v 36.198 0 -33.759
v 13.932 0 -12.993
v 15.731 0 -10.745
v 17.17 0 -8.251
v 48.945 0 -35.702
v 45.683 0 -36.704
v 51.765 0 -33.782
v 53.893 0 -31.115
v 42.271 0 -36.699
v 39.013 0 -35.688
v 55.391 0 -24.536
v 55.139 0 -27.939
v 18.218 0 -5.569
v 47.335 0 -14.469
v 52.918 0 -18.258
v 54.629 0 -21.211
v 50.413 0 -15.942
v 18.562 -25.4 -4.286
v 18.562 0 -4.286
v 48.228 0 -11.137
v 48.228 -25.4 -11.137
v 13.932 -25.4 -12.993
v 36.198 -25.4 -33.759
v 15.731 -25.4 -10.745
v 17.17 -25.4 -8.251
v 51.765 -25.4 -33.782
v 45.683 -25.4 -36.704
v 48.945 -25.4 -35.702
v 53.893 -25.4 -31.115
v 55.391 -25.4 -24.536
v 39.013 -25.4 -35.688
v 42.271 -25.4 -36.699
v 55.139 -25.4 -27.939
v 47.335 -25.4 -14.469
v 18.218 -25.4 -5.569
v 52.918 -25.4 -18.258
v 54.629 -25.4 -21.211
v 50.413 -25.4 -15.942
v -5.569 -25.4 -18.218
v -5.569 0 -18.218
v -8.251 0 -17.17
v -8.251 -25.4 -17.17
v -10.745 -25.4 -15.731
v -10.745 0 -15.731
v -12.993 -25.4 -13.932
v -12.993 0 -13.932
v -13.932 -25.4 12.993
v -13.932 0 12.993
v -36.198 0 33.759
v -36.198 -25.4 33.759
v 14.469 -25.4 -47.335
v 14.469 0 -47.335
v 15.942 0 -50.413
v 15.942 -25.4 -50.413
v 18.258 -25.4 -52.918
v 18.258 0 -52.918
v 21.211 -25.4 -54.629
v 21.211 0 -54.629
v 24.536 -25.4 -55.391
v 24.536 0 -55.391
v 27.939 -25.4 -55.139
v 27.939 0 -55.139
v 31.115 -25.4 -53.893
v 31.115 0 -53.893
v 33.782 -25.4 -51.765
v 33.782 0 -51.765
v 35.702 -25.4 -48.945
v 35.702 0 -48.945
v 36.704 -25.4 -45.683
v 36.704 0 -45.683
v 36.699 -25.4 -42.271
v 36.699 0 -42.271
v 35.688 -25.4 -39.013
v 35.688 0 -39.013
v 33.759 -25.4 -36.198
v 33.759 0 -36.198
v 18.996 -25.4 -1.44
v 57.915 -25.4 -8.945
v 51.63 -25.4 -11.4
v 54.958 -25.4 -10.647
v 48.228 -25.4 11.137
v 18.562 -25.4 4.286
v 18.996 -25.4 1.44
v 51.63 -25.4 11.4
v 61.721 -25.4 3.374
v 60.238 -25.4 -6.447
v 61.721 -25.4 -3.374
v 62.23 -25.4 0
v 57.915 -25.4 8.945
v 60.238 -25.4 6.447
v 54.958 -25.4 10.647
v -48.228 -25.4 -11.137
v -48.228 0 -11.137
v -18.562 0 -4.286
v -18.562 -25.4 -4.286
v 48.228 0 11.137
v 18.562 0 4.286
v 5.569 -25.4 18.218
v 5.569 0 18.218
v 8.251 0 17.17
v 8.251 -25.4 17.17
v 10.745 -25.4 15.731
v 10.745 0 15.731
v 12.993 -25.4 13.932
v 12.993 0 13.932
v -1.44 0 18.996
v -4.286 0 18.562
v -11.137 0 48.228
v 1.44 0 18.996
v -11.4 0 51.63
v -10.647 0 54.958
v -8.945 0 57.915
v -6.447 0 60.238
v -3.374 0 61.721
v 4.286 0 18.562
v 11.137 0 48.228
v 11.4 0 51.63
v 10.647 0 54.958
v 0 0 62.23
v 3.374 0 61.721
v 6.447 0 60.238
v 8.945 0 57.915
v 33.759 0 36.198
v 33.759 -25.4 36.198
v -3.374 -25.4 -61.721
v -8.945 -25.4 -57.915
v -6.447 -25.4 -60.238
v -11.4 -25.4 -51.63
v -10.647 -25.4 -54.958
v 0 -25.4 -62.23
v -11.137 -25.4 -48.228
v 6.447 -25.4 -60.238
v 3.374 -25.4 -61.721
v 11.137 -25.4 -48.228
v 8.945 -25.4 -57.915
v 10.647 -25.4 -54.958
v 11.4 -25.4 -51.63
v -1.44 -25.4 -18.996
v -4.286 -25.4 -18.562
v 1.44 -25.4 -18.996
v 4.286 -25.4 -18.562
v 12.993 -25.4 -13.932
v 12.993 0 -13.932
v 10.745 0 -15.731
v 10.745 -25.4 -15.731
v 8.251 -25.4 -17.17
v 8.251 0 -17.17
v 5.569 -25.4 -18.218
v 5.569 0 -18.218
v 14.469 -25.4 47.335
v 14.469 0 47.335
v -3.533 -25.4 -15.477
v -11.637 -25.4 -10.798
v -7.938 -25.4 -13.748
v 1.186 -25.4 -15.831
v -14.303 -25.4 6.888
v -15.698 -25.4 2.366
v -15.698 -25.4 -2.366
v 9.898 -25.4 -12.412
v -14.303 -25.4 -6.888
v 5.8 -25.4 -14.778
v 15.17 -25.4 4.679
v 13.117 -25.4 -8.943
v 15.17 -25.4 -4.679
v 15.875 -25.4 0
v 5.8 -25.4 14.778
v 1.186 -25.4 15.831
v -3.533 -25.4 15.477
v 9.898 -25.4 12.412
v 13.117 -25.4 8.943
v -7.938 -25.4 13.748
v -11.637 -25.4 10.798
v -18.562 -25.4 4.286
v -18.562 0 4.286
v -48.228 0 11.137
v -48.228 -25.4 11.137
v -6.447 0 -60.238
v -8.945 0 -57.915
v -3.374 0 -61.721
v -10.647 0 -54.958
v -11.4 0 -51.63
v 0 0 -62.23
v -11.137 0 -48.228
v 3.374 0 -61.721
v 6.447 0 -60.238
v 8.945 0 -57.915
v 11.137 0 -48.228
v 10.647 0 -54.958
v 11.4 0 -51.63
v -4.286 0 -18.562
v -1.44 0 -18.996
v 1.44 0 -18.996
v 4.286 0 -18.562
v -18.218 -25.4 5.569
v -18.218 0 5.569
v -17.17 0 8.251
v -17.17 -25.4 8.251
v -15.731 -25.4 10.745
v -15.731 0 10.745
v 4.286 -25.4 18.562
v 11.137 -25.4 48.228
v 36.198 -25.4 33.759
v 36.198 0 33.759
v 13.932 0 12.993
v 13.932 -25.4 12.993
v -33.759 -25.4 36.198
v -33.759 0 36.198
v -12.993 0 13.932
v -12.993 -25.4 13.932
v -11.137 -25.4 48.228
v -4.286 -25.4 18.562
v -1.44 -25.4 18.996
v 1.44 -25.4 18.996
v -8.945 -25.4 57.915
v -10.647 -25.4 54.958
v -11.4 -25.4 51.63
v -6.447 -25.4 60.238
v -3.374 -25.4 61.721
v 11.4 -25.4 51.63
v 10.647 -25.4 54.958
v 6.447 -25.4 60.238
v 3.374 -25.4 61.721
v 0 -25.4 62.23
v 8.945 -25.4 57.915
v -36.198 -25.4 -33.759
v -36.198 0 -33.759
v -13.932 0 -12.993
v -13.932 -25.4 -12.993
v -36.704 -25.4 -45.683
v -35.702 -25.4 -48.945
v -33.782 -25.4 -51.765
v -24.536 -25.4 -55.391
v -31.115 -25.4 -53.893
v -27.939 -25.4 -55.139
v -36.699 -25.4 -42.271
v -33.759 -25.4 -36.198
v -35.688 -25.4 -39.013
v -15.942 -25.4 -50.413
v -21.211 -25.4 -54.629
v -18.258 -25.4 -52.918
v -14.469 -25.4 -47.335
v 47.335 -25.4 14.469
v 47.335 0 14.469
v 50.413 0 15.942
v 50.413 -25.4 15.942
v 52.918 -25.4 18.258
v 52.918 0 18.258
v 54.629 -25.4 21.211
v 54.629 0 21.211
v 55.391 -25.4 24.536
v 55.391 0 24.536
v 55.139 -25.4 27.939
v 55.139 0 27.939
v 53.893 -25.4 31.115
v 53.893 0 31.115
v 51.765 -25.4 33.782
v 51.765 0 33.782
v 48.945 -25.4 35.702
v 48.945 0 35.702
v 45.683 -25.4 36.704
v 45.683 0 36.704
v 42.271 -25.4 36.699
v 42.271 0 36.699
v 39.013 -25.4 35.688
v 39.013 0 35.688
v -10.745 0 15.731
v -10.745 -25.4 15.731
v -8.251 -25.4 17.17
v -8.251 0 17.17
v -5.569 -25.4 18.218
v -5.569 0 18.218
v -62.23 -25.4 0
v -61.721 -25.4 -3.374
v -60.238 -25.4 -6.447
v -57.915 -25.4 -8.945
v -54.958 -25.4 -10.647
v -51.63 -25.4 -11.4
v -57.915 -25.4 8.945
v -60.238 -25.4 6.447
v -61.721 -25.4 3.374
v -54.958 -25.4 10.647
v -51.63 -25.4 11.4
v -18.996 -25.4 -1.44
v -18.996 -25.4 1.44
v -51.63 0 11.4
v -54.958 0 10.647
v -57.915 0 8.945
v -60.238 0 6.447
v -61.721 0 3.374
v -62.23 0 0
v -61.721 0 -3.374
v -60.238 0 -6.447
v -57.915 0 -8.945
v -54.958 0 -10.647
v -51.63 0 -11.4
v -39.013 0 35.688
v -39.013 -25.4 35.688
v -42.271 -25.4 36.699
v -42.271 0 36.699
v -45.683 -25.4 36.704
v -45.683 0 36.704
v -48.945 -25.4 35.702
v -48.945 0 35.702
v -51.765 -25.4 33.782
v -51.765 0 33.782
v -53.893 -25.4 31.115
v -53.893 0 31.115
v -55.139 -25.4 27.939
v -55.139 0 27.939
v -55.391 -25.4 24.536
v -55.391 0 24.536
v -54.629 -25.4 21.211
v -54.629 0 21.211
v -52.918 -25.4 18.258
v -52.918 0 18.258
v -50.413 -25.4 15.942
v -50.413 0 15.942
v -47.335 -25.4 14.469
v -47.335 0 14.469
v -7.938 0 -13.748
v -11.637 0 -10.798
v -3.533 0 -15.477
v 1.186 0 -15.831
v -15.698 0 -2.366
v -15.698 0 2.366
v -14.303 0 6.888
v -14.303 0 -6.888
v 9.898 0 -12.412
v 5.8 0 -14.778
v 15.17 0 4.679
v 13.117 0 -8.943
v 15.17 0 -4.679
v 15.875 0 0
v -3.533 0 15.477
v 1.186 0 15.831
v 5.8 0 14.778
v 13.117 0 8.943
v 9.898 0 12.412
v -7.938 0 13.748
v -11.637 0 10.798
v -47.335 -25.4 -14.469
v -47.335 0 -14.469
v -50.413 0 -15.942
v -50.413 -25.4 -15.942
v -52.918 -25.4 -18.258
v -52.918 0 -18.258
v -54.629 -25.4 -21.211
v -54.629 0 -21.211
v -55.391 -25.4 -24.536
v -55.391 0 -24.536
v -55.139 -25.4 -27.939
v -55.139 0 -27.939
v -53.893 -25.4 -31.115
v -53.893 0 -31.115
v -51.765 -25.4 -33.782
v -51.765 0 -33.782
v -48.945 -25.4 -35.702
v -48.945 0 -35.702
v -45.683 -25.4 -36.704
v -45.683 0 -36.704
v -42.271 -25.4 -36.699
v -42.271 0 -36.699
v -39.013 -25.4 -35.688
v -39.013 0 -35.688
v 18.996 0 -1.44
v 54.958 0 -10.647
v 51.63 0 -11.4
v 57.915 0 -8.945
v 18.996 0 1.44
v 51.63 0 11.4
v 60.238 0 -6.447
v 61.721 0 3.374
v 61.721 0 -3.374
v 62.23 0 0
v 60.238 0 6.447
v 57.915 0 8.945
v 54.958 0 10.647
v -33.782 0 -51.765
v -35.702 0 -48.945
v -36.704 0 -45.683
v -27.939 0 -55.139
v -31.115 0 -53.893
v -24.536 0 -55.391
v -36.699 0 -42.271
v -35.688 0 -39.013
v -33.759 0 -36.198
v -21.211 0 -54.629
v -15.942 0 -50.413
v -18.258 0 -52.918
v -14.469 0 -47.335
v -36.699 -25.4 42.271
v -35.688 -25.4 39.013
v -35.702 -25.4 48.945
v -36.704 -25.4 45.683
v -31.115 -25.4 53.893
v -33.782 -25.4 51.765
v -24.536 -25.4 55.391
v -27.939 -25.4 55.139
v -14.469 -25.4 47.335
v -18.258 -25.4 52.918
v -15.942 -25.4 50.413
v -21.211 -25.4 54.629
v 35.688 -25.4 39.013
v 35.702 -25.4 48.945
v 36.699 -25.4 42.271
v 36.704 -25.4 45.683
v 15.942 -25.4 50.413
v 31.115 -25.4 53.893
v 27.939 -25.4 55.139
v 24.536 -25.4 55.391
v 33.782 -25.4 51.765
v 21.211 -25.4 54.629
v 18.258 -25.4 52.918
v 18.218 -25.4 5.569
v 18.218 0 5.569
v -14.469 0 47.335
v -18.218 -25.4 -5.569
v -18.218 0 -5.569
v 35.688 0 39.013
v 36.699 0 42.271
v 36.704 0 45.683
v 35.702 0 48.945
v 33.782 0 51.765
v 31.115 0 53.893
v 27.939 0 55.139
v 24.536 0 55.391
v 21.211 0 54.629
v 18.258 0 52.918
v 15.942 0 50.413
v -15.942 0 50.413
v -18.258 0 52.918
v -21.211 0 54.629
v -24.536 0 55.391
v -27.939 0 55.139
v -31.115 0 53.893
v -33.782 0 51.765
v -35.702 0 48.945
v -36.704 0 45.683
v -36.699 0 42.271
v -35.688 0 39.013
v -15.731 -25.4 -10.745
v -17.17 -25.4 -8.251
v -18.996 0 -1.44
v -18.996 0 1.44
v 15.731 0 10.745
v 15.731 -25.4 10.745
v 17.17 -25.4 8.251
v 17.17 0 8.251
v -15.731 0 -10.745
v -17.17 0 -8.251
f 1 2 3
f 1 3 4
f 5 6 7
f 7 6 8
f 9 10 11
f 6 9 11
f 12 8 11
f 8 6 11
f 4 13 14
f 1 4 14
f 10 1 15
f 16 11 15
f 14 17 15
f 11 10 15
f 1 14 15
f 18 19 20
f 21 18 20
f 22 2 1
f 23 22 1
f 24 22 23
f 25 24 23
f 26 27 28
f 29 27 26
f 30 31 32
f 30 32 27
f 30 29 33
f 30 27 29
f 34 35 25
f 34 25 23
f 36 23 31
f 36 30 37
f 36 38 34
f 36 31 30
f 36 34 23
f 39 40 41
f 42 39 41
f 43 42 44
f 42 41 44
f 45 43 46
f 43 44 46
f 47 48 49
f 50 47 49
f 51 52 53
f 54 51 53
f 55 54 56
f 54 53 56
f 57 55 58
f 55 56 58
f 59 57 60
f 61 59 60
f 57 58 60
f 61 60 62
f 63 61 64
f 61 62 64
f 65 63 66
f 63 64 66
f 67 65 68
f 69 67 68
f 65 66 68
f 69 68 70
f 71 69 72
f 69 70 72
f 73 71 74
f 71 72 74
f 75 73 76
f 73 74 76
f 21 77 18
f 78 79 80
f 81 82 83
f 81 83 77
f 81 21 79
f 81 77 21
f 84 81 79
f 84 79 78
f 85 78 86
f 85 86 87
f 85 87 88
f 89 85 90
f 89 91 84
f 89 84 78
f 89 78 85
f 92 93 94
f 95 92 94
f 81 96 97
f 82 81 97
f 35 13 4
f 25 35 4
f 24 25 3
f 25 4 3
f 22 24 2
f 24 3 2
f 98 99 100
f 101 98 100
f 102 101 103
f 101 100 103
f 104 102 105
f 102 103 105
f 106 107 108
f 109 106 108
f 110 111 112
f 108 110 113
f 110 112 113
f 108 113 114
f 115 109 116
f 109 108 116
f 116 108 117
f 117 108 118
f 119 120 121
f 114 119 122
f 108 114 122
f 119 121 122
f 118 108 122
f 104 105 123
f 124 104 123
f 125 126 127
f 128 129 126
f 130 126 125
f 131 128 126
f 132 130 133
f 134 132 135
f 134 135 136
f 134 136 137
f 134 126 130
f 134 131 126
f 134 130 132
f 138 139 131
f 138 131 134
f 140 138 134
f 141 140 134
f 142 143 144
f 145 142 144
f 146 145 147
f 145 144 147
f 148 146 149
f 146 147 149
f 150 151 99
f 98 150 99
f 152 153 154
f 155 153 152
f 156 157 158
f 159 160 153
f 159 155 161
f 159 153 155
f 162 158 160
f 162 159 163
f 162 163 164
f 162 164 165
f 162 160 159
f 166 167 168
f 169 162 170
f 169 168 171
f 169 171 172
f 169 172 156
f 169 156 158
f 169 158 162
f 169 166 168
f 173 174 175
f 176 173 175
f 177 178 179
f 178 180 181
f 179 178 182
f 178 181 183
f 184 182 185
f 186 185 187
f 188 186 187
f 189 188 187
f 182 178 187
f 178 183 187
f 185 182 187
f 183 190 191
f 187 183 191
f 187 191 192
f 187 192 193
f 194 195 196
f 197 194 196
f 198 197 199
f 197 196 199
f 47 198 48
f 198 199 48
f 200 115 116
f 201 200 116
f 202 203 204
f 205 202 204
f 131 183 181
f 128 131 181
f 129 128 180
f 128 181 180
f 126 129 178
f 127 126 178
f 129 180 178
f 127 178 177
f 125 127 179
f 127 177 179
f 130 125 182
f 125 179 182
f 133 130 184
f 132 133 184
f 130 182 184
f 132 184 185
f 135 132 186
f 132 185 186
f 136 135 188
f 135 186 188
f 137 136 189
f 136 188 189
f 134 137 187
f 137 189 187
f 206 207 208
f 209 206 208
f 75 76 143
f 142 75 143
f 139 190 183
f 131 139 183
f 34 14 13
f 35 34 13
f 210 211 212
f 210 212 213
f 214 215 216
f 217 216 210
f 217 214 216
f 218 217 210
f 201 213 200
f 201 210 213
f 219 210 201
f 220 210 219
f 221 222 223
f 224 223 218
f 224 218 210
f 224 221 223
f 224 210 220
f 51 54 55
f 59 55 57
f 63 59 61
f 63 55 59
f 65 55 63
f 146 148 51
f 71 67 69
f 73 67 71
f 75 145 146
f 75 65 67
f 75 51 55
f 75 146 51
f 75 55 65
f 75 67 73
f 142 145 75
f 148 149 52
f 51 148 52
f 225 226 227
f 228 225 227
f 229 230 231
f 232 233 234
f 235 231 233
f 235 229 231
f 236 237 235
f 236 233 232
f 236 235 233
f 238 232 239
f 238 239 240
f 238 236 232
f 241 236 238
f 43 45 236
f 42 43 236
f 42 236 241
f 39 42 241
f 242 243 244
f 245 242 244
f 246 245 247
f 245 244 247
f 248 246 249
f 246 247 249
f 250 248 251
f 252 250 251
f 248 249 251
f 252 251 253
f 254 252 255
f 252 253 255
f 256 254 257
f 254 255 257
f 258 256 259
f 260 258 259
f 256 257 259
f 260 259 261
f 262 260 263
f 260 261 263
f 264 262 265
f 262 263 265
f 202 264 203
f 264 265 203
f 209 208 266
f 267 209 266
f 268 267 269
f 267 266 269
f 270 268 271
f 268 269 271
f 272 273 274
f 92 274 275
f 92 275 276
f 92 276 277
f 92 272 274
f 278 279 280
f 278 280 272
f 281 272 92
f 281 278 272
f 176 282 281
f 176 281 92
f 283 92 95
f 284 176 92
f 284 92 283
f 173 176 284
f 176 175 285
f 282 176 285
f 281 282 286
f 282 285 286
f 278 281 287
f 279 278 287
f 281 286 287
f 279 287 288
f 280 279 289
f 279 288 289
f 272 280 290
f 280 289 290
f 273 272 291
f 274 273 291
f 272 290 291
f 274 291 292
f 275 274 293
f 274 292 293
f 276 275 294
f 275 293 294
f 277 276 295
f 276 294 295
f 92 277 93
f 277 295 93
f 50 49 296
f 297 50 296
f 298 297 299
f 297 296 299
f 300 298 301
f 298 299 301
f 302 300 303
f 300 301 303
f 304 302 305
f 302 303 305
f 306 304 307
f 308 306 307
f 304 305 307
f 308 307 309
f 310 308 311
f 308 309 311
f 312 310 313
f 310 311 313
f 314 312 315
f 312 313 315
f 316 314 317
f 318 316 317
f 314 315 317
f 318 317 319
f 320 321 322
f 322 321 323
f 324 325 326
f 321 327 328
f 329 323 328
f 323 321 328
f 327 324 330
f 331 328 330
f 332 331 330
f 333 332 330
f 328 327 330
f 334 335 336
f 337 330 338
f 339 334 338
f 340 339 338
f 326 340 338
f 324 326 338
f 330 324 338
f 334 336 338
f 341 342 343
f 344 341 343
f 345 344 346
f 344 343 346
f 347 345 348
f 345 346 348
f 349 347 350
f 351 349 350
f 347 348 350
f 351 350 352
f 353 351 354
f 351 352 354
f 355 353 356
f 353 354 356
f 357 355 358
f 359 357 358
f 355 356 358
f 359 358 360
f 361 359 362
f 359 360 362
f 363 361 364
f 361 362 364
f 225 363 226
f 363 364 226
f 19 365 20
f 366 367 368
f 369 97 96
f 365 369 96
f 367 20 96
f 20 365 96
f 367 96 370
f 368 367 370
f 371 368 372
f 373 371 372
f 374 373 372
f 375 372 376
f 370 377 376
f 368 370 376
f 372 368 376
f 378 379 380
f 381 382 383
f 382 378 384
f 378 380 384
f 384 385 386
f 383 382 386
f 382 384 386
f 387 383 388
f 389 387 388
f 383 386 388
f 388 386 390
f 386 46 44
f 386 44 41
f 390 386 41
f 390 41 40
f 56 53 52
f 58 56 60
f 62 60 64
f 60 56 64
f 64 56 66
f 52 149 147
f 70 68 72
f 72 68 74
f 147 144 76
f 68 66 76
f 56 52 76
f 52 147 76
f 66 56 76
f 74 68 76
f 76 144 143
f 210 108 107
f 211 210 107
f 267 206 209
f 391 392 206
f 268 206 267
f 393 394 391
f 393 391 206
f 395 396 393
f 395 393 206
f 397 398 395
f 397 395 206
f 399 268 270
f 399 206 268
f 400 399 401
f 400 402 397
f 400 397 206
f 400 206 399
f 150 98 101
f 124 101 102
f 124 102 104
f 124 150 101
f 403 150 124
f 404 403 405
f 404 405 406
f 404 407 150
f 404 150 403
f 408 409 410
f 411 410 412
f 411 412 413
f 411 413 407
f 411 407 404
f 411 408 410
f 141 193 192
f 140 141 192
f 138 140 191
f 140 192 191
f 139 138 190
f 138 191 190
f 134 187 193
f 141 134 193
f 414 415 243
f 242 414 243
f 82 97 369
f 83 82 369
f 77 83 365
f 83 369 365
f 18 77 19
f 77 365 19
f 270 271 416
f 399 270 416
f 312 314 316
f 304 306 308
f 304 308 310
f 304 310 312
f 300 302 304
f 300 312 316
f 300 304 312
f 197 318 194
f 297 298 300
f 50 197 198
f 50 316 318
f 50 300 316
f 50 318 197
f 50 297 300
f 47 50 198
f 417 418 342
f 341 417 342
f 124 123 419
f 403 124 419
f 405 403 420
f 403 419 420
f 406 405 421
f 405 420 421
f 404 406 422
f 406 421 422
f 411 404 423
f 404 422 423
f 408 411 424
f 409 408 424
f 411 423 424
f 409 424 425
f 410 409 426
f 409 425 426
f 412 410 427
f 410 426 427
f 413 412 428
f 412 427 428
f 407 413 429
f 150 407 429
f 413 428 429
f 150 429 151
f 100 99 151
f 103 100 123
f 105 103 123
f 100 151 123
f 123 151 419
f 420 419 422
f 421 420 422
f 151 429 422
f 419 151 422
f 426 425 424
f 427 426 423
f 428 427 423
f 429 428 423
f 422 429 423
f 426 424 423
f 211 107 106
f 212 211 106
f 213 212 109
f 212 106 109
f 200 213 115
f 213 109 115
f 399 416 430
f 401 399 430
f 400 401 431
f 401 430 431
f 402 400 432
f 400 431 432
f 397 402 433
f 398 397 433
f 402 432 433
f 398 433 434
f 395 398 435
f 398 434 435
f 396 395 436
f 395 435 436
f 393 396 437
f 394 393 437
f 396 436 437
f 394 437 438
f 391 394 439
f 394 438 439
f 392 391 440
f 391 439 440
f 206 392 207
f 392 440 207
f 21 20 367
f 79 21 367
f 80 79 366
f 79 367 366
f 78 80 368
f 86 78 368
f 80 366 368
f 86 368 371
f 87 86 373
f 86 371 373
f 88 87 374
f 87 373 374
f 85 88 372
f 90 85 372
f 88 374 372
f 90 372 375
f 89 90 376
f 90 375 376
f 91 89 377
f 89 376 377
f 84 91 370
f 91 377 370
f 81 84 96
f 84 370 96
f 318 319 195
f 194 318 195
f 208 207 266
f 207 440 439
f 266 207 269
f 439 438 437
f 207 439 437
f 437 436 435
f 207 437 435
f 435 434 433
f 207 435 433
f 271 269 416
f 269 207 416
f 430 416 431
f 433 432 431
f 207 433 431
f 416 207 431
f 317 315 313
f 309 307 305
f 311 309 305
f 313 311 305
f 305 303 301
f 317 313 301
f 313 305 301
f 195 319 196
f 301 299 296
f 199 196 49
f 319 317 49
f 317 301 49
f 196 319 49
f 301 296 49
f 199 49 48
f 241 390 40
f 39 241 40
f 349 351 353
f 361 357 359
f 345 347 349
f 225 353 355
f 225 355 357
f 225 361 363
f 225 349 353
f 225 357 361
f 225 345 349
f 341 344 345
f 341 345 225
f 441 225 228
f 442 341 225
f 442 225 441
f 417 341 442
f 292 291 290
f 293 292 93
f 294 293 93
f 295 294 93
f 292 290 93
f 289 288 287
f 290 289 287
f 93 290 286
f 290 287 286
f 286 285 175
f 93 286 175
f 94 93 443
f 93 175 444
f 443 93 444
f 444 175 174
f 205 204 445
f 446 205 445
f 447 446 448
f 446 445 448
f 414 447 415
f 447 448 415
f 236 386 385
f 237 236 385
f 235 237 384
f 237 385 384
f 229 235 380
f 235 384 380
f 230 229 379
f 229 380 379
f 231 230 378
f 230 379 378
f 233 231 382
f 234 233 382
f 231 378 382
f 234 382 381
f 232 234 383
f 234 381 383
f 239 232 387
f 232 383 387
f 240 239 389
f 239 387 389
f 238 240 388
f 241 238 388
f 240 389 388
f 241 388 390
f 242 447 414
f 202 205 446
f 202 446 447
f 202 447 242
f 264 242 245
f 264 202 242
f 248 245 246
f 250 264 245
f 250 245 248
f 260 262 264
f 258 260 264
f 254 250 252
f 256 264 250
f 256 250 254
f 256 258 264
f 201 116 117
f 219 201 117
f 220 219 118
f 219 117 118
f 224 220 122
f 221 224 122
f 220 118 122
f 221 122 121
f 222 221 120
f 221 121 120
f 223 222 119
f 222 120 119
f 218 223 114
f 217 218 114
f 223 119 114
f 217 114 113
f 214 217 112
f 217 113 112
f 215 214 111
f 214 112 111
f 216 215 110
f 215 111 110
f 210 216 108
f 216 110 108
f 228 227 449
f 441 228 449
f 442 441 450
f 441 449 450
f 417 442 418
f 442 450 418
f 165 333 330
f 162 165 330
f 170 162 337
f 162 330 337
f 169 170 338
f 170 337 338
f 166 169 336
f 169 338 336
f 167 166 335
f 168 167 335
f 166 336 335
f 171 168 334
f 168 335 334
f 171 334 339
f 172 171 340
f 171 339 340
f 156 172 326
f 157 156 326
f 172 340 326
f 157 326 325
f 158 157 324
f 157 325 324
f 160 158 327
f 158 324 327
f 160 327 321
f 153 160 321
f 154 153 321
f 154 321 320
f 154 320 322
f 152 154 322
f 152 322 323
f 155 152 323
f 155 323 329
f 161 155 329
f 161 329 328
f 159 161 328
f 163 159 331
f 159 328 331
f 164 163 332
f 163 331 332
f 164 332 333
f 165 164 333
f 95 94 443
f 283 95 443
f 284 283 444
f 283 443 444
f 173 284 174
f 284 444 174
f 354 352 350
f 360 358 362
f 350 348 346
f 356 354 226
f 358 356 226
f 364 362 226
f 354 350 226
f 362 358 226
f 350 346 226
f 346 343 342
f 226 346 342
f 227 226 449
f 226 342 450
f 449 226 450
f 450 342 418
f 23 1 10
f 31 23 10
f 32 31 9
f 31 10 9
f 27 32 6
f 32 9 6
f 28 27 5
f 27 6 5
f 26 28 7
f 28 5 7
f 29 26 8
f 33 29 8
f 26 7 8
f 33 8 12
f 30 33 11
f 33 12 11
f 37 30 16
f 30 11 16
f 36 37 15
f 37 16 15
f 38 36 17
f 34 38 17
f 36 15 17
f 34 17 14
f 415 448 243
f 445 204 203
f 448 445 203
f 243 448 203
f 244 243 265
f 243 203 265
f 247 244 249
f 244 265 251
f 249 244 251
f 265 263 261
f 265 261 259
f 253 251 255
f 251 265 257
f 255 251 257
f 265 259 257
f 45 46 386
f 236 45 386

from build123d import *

# Parameters (mm, degrees)
F0_R     = 15.875
F1_DEPTH = 25.4


with BuildPart() as f1:
    # F0 (on Front) → F1 (new body)
    with BuildSketch(Plane.XZ):
        with BuildLine():
            ThreePointArc((-4.28625, 18.561534), (0, 19.05), (4.28625, 18.561534))
            Line((4.28625, 18.561534), (11.136921, 48.22825))
            ThreePointArc((11.136921, 48.22825), (0, 62.23), (-11.136921, 48.22825))
            Line((-11.136921, 48.22825), (-4.28625, 18.561534))
        make_face()
        Circle(F0_R)
        with BuildLine():
            ThreePointArc((-12.992769, 13.931635), (-9.525, 16.497784), (-5.568766, 18.217885))
            Line((-5.568766, 18.217885), (-14.469269, 47.33535))
            ThreePointArc((-14.469269, 47.33535), (-31.115, 53.892761), (-33.758981, 36.198429))
            Line((-33.758981, 36.198429), (-12.992769, 13.931635))
        make_face()
        with BuildLine():
            ThreePointArc((-18.217885, 5.568766), (-16.497784, 9.525), (-13.931635, 12.992769))
            Line((-13.931635, 12.992769), (-36.198429, 33.758981))
            ThreePointArc((-36.198429, 33.758981), (-53.892761, 31.115), (-47.33535, 14.469269))
            Line((-47.33535, 14.469269), (-18.217885, 5.568766))
        make_face()
        with BuildLine():
            ThreePointArc((-18.561534, -4.28625), (-19.05, 0), (-18.561534, 4.28625))
            Line((-18.561534, 4.28625), (-48.22825, 11.136921))
            ThreePointArc((-48.22825, 11.136921), (-62.23, 0), (-48.22825, -11.136921))
            Line((-48.22825, -11.136921), (-18.561534, -4.28625))
        make_face()
        with BuildLine():
            ThreePointArc((-13.931635, -12.992769), (-16.497784, -9.525), (-18.217885, -5.568766))
            Line((-18.217885, -5.568766), (-47.33535, -14.469269))
            ThreePointArc((-47.33535, -14.469269), (-53.892761, -31.115), (-36.198429, -33.758981))
            Line((-36.198429, -33.758981), (-13.931635, -12.992769))
        make_face()
        with BuildLine():
            ThreePointArc((-5.568766, -18.217885), (-9.525, -16.497784), (-12.992769, -13.931635))
            Line((-12.992769, -13.931635), (-33.758981, -36.198429))
            ThreePointArc((-33.758981, -36.198429), (-31.115, -53.892761), (-14.469269, -47.33535))
            Line((-14.469269, -47.33535), (-5.568766, -18.217885))
        make_face()
        with BuildLine():
            ThreePointArc((4.28625, -18.561534), (0, -19.05), (-4.28625, -18.561534))
            Line((-4.28625, -18.561534), (-11.136921, -48.22825))
            ThreePointArc((-11.136921, -48.22825), (0, -62.23), (11.136921, -48.22825))
            Line((11.136921, -48.22825), (4.28625, -18.561534))
        make_face()
        with BuildLine():
            ThreePointArc((12.992769, -13.931635), (9.525, -16.497784), (5.568766, -18.217885))
            Line((5.568766, -18.217885), (14.469269, -47.33535))
            ThreePointArc((14.469269, -47.33535), (31.115, -53.892761), (33.758981, -36.198429))
            Line((33.758981, -36.198429), (12.992769, -13.931635))
        make_face()
        with BuildLine():
            ThreePointArc((18.217885, -5.568766), (16.497784, -9.525), (13.931635, -12.992769))
            Line((13.931635, -12.992769), (36.198429, -33.758981))
            ThreePointArc((36.198429, -33.758981), (53.892761, -31.115), (47.33535, -14.469269))
            Line((47.33535, -14.469269), (18.217885, -5.568766))
        make_face()
        with BuildLine():
            ThreePointArc((18.561534, 4.28625), (19.05, 0), (18.561534, -4.28625))
            Line((18.561534, -4.28625), (48.22825, -11.136921))
            ThreePointArc((48.22825, -11.136921), (62.23, 0), (48.22825, 11.136921))
            Line((48.22825, 11.136921), (18.561534, 4.28625))
        make_face()
        with BuildLine():
            ThreePointArc((13.931635, 12.992769), (16.497784, 9.525), (18.217885, 5.568766))
            Line((18.217885, 5.568766), (47.33535, 14.469269))
            ThreePointArc((47.33535, 14.469269), (53.892761, 31.115), (36.198429, 33.758981))
            Line((36.198429, 33.758981), (13.931635, 12.992769))
        make_face()
        with BuildLine():
            ThreePointArc((5.568766, 18.217885), (9.525, 16.497784), (12.992769, 13.931635))
            Line((12.992769, 13.931635), (33.758981, 36.198429))
            ThreePointArc((33.758981, 36.198429), (31.115, 53.892761), (14.469269, 47.33535))
            Line((14.469269, 47.33535), (5.568766, 18.217885))
        make_face()
    extrude(amount=F1_DEPTH)


solid = f1.part
